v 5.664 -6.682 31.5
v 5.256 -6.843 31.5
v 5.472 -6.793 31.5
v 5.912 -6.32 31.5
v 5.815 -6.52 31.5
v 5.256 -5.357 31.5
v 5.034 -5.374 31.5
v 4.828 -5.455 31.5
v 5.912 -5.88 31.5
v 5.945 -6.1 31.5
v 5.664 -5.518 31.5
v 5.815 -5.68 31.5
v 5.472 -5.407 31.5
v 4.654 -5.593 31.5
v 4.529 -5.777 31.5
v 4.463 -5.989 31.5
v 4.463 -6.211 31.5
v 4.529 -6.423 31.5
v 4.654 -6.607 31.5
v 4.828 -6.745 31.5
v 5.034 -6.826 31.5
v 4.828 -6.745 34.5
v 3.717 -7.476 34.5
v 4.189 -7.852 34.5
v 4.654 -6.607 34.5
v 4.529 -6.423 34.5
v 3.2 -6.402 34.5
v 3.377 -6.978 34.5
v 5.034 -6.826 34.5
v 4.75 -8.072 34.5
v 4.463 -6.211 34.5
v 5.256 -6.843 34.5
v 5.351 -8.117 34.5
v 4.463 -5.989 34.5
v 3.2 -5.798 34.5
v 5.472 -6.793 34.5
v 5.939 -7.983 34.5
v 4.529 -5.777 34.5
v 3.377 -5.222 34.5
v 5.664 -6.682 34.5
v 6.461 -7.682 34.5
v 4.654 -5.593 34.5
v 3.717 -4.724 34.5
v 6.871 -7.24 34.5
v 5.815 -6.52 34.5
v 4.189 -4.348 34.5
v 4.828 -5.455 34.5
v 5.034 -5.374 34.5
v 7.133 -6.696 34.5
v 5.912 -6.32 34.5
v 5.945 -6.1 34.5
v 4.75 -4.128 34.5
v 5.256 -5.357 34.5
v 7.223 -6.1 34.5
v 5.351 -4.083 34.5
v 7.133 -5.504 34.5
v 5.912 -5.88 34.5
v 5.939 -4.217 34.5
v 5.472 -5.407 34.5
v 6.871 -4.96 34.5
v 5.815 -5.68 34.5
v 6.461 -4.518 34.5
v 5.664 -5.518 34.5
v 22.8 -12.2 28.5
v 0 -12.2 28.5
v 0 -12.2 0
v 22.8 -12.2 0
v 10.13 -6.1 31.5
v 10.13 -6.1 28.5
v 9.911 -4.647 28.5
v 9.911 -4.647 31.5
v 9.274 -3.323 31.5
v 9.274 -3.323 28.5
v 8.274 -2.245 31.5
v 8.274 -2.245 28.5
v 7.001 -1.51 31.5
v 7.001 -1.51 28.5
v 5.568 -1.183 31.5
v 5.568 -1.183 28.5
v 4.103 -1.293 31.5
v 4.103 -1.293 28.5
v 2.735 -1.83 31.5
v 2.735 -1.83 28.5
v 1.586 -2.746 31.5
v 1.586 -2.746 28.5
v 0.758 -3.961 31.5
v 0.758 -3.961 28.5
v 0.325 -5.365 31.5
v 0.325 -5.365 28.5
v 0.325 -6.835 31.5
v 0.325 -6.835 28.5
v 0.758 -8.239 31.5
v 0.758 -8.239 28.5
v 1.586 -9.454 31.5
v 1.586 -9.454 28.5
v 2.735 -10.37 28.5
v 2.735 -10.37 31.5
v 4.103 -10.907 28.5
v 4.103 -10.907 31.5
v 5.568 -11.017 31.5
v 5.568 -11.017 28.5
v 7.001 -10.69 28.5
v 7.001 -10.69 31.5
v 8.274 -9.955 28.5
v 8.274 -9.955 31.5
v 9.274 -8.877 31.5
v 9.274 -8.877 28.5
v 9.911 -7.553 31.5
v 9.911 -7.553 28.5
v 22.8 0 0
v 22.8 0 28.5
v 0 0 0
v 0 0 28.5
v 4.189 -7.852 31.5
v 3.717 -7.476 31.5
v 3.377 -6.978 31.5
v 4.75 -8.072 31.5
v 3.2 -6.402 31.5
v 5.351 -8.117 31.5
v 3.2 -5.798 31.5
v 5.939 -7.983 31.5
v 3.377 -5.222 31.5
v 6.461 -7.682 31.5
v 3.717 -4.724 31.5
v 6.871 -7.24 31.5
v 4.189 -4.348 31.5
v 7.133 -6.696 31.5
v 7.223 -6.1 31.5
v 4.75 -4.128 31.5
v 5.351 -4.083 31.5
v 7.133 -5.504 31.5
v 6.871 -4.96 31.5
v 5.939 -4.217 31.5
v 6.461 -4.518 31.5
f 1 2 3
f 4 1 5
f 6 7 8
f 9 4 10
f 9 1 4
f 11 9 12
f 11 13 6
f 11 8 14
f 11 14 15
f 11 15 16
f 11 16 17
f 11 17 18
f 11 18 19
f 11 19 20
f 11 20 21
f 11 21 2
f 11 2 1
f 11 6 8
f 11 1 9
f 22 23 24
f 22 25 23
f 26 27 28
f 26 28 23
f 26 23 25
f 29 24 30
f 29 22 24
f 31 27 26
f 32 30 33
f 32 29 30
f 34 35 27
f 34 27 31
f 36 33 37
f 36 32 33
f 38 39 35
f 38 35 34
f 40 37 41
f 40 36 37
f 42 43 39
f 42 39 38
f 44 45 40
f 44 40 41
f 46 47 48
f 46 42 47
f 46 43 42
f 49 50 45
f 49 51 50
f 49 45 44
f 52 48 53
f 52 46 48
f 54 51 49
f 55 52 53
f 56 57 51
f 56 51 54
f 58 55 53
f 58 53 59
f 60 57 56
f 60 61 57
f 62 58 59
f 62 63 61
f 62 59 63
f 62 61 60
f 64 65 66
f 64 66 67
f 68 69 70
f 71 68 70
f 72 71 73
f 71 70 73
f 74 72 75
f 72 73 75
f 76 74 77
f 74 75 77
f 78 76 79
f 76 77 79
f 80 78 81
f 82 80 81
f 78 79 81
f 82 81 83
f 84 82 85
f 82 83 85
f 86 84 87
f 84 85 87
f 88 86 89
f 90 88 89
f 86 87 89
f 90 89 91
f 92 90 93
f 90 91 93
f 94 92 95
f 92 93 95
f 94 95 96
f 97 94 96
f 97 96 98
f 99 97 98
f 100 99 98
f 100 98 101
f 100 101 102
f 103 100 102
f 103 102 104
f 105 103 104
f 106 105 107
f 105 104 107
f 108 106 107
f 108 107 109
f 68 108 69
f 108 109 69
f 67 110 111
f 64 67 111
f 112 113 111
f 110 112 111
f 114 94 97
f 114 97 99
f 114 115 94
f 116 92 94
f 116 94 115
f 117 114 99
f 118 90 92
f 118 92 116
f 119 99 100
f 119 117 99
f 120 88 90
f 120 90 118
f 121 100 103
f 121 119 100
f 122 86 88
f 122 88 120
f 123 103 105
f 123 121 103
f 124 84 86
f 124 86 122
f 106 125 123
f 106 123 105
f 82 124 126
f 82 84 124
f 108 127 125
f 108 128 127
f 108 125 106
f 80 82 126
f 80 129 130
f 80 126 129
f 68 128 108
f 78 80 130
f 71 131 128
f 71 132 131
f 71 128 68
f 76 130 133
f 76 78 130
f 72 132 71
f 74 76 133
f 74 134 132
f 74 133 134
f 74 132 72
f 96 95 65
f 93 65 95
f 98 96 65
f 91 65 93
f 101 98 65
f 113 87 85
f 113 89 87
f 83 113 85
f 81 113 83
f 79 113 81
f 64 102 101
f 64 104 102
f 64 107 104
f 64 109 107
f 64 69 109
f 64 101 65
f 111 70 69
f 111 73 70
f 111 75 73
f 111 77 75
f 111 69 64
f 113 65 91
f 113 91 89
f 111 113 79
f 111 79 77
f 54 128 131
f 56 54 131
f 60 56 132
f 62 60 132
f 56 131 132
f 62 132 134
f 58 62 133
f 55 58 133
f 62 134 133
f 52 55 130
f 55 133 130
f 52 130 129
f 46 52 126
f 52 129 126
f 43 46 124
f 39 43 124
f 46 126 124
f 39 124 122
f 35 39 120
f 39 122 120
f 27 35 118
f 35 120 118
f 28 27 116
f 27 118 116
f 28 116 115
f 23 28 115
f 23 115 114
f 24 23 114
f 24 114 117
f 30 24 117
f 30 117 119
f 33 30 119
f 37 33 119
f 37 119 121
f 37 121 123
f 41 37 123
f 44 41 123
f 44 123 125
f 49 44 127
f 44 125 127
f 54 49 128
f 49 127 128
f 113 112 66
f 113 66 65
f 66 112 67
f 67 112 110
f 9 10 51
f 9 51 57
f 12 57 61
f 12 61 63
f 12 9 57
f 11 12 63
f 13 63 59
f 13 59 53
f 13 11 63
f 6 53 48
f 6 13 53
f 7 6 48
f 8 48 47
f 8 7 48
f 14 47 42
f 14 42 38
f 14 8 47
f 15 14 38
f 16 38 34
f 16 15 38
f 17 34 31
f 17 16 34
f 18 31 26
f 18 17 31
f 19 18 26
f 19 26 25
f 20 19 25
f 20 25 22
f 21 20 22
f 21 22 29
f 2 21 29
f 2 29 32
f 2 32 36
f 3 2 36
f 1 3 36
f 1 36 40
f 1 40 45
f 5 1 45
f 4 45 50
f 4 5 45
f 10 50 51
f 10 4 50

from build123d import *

# Parameters (mm, degrees)
F0_W     = 22.8
F0_H     = 28.5
F1_DEPTH = 12.2
F2_R     = 4.930389
F3_DEPTH = 3
F4_R     = 2.022954
F4_R_2   = 0.744862
F5_DEPTH = 3


with BuildPart() as f1:
    # F0 (on Front) → F1 (new body)
    with BuildSketch(Plane.XZ):
        with Locations((11.4, 14.25)):
            Rectangle(F0_W, F0_H)
    extrude(amount=F1_DEPTH)

    # F2 (on face) → F3 (join)
    with BuildSketch(Plane.XY.offset(28.5)):
        with Locations((5.2, -6.1)):
            Circle(F2_R)
    extrude(amount=F3_DEPTH)

    # F4 (on face) → F5 (join)
    with BuildSketch(Plane.XY.offset(31.5)):
        with Locations((5.2, -6.1)):
            Circle(F4_R)
        with Locations((5.2, -6.1)):
            Circle(F4_R_2, mode=Mode.SUBTRACT)
    extrude(amount=F5_DEPTH)


solid = f1.part
